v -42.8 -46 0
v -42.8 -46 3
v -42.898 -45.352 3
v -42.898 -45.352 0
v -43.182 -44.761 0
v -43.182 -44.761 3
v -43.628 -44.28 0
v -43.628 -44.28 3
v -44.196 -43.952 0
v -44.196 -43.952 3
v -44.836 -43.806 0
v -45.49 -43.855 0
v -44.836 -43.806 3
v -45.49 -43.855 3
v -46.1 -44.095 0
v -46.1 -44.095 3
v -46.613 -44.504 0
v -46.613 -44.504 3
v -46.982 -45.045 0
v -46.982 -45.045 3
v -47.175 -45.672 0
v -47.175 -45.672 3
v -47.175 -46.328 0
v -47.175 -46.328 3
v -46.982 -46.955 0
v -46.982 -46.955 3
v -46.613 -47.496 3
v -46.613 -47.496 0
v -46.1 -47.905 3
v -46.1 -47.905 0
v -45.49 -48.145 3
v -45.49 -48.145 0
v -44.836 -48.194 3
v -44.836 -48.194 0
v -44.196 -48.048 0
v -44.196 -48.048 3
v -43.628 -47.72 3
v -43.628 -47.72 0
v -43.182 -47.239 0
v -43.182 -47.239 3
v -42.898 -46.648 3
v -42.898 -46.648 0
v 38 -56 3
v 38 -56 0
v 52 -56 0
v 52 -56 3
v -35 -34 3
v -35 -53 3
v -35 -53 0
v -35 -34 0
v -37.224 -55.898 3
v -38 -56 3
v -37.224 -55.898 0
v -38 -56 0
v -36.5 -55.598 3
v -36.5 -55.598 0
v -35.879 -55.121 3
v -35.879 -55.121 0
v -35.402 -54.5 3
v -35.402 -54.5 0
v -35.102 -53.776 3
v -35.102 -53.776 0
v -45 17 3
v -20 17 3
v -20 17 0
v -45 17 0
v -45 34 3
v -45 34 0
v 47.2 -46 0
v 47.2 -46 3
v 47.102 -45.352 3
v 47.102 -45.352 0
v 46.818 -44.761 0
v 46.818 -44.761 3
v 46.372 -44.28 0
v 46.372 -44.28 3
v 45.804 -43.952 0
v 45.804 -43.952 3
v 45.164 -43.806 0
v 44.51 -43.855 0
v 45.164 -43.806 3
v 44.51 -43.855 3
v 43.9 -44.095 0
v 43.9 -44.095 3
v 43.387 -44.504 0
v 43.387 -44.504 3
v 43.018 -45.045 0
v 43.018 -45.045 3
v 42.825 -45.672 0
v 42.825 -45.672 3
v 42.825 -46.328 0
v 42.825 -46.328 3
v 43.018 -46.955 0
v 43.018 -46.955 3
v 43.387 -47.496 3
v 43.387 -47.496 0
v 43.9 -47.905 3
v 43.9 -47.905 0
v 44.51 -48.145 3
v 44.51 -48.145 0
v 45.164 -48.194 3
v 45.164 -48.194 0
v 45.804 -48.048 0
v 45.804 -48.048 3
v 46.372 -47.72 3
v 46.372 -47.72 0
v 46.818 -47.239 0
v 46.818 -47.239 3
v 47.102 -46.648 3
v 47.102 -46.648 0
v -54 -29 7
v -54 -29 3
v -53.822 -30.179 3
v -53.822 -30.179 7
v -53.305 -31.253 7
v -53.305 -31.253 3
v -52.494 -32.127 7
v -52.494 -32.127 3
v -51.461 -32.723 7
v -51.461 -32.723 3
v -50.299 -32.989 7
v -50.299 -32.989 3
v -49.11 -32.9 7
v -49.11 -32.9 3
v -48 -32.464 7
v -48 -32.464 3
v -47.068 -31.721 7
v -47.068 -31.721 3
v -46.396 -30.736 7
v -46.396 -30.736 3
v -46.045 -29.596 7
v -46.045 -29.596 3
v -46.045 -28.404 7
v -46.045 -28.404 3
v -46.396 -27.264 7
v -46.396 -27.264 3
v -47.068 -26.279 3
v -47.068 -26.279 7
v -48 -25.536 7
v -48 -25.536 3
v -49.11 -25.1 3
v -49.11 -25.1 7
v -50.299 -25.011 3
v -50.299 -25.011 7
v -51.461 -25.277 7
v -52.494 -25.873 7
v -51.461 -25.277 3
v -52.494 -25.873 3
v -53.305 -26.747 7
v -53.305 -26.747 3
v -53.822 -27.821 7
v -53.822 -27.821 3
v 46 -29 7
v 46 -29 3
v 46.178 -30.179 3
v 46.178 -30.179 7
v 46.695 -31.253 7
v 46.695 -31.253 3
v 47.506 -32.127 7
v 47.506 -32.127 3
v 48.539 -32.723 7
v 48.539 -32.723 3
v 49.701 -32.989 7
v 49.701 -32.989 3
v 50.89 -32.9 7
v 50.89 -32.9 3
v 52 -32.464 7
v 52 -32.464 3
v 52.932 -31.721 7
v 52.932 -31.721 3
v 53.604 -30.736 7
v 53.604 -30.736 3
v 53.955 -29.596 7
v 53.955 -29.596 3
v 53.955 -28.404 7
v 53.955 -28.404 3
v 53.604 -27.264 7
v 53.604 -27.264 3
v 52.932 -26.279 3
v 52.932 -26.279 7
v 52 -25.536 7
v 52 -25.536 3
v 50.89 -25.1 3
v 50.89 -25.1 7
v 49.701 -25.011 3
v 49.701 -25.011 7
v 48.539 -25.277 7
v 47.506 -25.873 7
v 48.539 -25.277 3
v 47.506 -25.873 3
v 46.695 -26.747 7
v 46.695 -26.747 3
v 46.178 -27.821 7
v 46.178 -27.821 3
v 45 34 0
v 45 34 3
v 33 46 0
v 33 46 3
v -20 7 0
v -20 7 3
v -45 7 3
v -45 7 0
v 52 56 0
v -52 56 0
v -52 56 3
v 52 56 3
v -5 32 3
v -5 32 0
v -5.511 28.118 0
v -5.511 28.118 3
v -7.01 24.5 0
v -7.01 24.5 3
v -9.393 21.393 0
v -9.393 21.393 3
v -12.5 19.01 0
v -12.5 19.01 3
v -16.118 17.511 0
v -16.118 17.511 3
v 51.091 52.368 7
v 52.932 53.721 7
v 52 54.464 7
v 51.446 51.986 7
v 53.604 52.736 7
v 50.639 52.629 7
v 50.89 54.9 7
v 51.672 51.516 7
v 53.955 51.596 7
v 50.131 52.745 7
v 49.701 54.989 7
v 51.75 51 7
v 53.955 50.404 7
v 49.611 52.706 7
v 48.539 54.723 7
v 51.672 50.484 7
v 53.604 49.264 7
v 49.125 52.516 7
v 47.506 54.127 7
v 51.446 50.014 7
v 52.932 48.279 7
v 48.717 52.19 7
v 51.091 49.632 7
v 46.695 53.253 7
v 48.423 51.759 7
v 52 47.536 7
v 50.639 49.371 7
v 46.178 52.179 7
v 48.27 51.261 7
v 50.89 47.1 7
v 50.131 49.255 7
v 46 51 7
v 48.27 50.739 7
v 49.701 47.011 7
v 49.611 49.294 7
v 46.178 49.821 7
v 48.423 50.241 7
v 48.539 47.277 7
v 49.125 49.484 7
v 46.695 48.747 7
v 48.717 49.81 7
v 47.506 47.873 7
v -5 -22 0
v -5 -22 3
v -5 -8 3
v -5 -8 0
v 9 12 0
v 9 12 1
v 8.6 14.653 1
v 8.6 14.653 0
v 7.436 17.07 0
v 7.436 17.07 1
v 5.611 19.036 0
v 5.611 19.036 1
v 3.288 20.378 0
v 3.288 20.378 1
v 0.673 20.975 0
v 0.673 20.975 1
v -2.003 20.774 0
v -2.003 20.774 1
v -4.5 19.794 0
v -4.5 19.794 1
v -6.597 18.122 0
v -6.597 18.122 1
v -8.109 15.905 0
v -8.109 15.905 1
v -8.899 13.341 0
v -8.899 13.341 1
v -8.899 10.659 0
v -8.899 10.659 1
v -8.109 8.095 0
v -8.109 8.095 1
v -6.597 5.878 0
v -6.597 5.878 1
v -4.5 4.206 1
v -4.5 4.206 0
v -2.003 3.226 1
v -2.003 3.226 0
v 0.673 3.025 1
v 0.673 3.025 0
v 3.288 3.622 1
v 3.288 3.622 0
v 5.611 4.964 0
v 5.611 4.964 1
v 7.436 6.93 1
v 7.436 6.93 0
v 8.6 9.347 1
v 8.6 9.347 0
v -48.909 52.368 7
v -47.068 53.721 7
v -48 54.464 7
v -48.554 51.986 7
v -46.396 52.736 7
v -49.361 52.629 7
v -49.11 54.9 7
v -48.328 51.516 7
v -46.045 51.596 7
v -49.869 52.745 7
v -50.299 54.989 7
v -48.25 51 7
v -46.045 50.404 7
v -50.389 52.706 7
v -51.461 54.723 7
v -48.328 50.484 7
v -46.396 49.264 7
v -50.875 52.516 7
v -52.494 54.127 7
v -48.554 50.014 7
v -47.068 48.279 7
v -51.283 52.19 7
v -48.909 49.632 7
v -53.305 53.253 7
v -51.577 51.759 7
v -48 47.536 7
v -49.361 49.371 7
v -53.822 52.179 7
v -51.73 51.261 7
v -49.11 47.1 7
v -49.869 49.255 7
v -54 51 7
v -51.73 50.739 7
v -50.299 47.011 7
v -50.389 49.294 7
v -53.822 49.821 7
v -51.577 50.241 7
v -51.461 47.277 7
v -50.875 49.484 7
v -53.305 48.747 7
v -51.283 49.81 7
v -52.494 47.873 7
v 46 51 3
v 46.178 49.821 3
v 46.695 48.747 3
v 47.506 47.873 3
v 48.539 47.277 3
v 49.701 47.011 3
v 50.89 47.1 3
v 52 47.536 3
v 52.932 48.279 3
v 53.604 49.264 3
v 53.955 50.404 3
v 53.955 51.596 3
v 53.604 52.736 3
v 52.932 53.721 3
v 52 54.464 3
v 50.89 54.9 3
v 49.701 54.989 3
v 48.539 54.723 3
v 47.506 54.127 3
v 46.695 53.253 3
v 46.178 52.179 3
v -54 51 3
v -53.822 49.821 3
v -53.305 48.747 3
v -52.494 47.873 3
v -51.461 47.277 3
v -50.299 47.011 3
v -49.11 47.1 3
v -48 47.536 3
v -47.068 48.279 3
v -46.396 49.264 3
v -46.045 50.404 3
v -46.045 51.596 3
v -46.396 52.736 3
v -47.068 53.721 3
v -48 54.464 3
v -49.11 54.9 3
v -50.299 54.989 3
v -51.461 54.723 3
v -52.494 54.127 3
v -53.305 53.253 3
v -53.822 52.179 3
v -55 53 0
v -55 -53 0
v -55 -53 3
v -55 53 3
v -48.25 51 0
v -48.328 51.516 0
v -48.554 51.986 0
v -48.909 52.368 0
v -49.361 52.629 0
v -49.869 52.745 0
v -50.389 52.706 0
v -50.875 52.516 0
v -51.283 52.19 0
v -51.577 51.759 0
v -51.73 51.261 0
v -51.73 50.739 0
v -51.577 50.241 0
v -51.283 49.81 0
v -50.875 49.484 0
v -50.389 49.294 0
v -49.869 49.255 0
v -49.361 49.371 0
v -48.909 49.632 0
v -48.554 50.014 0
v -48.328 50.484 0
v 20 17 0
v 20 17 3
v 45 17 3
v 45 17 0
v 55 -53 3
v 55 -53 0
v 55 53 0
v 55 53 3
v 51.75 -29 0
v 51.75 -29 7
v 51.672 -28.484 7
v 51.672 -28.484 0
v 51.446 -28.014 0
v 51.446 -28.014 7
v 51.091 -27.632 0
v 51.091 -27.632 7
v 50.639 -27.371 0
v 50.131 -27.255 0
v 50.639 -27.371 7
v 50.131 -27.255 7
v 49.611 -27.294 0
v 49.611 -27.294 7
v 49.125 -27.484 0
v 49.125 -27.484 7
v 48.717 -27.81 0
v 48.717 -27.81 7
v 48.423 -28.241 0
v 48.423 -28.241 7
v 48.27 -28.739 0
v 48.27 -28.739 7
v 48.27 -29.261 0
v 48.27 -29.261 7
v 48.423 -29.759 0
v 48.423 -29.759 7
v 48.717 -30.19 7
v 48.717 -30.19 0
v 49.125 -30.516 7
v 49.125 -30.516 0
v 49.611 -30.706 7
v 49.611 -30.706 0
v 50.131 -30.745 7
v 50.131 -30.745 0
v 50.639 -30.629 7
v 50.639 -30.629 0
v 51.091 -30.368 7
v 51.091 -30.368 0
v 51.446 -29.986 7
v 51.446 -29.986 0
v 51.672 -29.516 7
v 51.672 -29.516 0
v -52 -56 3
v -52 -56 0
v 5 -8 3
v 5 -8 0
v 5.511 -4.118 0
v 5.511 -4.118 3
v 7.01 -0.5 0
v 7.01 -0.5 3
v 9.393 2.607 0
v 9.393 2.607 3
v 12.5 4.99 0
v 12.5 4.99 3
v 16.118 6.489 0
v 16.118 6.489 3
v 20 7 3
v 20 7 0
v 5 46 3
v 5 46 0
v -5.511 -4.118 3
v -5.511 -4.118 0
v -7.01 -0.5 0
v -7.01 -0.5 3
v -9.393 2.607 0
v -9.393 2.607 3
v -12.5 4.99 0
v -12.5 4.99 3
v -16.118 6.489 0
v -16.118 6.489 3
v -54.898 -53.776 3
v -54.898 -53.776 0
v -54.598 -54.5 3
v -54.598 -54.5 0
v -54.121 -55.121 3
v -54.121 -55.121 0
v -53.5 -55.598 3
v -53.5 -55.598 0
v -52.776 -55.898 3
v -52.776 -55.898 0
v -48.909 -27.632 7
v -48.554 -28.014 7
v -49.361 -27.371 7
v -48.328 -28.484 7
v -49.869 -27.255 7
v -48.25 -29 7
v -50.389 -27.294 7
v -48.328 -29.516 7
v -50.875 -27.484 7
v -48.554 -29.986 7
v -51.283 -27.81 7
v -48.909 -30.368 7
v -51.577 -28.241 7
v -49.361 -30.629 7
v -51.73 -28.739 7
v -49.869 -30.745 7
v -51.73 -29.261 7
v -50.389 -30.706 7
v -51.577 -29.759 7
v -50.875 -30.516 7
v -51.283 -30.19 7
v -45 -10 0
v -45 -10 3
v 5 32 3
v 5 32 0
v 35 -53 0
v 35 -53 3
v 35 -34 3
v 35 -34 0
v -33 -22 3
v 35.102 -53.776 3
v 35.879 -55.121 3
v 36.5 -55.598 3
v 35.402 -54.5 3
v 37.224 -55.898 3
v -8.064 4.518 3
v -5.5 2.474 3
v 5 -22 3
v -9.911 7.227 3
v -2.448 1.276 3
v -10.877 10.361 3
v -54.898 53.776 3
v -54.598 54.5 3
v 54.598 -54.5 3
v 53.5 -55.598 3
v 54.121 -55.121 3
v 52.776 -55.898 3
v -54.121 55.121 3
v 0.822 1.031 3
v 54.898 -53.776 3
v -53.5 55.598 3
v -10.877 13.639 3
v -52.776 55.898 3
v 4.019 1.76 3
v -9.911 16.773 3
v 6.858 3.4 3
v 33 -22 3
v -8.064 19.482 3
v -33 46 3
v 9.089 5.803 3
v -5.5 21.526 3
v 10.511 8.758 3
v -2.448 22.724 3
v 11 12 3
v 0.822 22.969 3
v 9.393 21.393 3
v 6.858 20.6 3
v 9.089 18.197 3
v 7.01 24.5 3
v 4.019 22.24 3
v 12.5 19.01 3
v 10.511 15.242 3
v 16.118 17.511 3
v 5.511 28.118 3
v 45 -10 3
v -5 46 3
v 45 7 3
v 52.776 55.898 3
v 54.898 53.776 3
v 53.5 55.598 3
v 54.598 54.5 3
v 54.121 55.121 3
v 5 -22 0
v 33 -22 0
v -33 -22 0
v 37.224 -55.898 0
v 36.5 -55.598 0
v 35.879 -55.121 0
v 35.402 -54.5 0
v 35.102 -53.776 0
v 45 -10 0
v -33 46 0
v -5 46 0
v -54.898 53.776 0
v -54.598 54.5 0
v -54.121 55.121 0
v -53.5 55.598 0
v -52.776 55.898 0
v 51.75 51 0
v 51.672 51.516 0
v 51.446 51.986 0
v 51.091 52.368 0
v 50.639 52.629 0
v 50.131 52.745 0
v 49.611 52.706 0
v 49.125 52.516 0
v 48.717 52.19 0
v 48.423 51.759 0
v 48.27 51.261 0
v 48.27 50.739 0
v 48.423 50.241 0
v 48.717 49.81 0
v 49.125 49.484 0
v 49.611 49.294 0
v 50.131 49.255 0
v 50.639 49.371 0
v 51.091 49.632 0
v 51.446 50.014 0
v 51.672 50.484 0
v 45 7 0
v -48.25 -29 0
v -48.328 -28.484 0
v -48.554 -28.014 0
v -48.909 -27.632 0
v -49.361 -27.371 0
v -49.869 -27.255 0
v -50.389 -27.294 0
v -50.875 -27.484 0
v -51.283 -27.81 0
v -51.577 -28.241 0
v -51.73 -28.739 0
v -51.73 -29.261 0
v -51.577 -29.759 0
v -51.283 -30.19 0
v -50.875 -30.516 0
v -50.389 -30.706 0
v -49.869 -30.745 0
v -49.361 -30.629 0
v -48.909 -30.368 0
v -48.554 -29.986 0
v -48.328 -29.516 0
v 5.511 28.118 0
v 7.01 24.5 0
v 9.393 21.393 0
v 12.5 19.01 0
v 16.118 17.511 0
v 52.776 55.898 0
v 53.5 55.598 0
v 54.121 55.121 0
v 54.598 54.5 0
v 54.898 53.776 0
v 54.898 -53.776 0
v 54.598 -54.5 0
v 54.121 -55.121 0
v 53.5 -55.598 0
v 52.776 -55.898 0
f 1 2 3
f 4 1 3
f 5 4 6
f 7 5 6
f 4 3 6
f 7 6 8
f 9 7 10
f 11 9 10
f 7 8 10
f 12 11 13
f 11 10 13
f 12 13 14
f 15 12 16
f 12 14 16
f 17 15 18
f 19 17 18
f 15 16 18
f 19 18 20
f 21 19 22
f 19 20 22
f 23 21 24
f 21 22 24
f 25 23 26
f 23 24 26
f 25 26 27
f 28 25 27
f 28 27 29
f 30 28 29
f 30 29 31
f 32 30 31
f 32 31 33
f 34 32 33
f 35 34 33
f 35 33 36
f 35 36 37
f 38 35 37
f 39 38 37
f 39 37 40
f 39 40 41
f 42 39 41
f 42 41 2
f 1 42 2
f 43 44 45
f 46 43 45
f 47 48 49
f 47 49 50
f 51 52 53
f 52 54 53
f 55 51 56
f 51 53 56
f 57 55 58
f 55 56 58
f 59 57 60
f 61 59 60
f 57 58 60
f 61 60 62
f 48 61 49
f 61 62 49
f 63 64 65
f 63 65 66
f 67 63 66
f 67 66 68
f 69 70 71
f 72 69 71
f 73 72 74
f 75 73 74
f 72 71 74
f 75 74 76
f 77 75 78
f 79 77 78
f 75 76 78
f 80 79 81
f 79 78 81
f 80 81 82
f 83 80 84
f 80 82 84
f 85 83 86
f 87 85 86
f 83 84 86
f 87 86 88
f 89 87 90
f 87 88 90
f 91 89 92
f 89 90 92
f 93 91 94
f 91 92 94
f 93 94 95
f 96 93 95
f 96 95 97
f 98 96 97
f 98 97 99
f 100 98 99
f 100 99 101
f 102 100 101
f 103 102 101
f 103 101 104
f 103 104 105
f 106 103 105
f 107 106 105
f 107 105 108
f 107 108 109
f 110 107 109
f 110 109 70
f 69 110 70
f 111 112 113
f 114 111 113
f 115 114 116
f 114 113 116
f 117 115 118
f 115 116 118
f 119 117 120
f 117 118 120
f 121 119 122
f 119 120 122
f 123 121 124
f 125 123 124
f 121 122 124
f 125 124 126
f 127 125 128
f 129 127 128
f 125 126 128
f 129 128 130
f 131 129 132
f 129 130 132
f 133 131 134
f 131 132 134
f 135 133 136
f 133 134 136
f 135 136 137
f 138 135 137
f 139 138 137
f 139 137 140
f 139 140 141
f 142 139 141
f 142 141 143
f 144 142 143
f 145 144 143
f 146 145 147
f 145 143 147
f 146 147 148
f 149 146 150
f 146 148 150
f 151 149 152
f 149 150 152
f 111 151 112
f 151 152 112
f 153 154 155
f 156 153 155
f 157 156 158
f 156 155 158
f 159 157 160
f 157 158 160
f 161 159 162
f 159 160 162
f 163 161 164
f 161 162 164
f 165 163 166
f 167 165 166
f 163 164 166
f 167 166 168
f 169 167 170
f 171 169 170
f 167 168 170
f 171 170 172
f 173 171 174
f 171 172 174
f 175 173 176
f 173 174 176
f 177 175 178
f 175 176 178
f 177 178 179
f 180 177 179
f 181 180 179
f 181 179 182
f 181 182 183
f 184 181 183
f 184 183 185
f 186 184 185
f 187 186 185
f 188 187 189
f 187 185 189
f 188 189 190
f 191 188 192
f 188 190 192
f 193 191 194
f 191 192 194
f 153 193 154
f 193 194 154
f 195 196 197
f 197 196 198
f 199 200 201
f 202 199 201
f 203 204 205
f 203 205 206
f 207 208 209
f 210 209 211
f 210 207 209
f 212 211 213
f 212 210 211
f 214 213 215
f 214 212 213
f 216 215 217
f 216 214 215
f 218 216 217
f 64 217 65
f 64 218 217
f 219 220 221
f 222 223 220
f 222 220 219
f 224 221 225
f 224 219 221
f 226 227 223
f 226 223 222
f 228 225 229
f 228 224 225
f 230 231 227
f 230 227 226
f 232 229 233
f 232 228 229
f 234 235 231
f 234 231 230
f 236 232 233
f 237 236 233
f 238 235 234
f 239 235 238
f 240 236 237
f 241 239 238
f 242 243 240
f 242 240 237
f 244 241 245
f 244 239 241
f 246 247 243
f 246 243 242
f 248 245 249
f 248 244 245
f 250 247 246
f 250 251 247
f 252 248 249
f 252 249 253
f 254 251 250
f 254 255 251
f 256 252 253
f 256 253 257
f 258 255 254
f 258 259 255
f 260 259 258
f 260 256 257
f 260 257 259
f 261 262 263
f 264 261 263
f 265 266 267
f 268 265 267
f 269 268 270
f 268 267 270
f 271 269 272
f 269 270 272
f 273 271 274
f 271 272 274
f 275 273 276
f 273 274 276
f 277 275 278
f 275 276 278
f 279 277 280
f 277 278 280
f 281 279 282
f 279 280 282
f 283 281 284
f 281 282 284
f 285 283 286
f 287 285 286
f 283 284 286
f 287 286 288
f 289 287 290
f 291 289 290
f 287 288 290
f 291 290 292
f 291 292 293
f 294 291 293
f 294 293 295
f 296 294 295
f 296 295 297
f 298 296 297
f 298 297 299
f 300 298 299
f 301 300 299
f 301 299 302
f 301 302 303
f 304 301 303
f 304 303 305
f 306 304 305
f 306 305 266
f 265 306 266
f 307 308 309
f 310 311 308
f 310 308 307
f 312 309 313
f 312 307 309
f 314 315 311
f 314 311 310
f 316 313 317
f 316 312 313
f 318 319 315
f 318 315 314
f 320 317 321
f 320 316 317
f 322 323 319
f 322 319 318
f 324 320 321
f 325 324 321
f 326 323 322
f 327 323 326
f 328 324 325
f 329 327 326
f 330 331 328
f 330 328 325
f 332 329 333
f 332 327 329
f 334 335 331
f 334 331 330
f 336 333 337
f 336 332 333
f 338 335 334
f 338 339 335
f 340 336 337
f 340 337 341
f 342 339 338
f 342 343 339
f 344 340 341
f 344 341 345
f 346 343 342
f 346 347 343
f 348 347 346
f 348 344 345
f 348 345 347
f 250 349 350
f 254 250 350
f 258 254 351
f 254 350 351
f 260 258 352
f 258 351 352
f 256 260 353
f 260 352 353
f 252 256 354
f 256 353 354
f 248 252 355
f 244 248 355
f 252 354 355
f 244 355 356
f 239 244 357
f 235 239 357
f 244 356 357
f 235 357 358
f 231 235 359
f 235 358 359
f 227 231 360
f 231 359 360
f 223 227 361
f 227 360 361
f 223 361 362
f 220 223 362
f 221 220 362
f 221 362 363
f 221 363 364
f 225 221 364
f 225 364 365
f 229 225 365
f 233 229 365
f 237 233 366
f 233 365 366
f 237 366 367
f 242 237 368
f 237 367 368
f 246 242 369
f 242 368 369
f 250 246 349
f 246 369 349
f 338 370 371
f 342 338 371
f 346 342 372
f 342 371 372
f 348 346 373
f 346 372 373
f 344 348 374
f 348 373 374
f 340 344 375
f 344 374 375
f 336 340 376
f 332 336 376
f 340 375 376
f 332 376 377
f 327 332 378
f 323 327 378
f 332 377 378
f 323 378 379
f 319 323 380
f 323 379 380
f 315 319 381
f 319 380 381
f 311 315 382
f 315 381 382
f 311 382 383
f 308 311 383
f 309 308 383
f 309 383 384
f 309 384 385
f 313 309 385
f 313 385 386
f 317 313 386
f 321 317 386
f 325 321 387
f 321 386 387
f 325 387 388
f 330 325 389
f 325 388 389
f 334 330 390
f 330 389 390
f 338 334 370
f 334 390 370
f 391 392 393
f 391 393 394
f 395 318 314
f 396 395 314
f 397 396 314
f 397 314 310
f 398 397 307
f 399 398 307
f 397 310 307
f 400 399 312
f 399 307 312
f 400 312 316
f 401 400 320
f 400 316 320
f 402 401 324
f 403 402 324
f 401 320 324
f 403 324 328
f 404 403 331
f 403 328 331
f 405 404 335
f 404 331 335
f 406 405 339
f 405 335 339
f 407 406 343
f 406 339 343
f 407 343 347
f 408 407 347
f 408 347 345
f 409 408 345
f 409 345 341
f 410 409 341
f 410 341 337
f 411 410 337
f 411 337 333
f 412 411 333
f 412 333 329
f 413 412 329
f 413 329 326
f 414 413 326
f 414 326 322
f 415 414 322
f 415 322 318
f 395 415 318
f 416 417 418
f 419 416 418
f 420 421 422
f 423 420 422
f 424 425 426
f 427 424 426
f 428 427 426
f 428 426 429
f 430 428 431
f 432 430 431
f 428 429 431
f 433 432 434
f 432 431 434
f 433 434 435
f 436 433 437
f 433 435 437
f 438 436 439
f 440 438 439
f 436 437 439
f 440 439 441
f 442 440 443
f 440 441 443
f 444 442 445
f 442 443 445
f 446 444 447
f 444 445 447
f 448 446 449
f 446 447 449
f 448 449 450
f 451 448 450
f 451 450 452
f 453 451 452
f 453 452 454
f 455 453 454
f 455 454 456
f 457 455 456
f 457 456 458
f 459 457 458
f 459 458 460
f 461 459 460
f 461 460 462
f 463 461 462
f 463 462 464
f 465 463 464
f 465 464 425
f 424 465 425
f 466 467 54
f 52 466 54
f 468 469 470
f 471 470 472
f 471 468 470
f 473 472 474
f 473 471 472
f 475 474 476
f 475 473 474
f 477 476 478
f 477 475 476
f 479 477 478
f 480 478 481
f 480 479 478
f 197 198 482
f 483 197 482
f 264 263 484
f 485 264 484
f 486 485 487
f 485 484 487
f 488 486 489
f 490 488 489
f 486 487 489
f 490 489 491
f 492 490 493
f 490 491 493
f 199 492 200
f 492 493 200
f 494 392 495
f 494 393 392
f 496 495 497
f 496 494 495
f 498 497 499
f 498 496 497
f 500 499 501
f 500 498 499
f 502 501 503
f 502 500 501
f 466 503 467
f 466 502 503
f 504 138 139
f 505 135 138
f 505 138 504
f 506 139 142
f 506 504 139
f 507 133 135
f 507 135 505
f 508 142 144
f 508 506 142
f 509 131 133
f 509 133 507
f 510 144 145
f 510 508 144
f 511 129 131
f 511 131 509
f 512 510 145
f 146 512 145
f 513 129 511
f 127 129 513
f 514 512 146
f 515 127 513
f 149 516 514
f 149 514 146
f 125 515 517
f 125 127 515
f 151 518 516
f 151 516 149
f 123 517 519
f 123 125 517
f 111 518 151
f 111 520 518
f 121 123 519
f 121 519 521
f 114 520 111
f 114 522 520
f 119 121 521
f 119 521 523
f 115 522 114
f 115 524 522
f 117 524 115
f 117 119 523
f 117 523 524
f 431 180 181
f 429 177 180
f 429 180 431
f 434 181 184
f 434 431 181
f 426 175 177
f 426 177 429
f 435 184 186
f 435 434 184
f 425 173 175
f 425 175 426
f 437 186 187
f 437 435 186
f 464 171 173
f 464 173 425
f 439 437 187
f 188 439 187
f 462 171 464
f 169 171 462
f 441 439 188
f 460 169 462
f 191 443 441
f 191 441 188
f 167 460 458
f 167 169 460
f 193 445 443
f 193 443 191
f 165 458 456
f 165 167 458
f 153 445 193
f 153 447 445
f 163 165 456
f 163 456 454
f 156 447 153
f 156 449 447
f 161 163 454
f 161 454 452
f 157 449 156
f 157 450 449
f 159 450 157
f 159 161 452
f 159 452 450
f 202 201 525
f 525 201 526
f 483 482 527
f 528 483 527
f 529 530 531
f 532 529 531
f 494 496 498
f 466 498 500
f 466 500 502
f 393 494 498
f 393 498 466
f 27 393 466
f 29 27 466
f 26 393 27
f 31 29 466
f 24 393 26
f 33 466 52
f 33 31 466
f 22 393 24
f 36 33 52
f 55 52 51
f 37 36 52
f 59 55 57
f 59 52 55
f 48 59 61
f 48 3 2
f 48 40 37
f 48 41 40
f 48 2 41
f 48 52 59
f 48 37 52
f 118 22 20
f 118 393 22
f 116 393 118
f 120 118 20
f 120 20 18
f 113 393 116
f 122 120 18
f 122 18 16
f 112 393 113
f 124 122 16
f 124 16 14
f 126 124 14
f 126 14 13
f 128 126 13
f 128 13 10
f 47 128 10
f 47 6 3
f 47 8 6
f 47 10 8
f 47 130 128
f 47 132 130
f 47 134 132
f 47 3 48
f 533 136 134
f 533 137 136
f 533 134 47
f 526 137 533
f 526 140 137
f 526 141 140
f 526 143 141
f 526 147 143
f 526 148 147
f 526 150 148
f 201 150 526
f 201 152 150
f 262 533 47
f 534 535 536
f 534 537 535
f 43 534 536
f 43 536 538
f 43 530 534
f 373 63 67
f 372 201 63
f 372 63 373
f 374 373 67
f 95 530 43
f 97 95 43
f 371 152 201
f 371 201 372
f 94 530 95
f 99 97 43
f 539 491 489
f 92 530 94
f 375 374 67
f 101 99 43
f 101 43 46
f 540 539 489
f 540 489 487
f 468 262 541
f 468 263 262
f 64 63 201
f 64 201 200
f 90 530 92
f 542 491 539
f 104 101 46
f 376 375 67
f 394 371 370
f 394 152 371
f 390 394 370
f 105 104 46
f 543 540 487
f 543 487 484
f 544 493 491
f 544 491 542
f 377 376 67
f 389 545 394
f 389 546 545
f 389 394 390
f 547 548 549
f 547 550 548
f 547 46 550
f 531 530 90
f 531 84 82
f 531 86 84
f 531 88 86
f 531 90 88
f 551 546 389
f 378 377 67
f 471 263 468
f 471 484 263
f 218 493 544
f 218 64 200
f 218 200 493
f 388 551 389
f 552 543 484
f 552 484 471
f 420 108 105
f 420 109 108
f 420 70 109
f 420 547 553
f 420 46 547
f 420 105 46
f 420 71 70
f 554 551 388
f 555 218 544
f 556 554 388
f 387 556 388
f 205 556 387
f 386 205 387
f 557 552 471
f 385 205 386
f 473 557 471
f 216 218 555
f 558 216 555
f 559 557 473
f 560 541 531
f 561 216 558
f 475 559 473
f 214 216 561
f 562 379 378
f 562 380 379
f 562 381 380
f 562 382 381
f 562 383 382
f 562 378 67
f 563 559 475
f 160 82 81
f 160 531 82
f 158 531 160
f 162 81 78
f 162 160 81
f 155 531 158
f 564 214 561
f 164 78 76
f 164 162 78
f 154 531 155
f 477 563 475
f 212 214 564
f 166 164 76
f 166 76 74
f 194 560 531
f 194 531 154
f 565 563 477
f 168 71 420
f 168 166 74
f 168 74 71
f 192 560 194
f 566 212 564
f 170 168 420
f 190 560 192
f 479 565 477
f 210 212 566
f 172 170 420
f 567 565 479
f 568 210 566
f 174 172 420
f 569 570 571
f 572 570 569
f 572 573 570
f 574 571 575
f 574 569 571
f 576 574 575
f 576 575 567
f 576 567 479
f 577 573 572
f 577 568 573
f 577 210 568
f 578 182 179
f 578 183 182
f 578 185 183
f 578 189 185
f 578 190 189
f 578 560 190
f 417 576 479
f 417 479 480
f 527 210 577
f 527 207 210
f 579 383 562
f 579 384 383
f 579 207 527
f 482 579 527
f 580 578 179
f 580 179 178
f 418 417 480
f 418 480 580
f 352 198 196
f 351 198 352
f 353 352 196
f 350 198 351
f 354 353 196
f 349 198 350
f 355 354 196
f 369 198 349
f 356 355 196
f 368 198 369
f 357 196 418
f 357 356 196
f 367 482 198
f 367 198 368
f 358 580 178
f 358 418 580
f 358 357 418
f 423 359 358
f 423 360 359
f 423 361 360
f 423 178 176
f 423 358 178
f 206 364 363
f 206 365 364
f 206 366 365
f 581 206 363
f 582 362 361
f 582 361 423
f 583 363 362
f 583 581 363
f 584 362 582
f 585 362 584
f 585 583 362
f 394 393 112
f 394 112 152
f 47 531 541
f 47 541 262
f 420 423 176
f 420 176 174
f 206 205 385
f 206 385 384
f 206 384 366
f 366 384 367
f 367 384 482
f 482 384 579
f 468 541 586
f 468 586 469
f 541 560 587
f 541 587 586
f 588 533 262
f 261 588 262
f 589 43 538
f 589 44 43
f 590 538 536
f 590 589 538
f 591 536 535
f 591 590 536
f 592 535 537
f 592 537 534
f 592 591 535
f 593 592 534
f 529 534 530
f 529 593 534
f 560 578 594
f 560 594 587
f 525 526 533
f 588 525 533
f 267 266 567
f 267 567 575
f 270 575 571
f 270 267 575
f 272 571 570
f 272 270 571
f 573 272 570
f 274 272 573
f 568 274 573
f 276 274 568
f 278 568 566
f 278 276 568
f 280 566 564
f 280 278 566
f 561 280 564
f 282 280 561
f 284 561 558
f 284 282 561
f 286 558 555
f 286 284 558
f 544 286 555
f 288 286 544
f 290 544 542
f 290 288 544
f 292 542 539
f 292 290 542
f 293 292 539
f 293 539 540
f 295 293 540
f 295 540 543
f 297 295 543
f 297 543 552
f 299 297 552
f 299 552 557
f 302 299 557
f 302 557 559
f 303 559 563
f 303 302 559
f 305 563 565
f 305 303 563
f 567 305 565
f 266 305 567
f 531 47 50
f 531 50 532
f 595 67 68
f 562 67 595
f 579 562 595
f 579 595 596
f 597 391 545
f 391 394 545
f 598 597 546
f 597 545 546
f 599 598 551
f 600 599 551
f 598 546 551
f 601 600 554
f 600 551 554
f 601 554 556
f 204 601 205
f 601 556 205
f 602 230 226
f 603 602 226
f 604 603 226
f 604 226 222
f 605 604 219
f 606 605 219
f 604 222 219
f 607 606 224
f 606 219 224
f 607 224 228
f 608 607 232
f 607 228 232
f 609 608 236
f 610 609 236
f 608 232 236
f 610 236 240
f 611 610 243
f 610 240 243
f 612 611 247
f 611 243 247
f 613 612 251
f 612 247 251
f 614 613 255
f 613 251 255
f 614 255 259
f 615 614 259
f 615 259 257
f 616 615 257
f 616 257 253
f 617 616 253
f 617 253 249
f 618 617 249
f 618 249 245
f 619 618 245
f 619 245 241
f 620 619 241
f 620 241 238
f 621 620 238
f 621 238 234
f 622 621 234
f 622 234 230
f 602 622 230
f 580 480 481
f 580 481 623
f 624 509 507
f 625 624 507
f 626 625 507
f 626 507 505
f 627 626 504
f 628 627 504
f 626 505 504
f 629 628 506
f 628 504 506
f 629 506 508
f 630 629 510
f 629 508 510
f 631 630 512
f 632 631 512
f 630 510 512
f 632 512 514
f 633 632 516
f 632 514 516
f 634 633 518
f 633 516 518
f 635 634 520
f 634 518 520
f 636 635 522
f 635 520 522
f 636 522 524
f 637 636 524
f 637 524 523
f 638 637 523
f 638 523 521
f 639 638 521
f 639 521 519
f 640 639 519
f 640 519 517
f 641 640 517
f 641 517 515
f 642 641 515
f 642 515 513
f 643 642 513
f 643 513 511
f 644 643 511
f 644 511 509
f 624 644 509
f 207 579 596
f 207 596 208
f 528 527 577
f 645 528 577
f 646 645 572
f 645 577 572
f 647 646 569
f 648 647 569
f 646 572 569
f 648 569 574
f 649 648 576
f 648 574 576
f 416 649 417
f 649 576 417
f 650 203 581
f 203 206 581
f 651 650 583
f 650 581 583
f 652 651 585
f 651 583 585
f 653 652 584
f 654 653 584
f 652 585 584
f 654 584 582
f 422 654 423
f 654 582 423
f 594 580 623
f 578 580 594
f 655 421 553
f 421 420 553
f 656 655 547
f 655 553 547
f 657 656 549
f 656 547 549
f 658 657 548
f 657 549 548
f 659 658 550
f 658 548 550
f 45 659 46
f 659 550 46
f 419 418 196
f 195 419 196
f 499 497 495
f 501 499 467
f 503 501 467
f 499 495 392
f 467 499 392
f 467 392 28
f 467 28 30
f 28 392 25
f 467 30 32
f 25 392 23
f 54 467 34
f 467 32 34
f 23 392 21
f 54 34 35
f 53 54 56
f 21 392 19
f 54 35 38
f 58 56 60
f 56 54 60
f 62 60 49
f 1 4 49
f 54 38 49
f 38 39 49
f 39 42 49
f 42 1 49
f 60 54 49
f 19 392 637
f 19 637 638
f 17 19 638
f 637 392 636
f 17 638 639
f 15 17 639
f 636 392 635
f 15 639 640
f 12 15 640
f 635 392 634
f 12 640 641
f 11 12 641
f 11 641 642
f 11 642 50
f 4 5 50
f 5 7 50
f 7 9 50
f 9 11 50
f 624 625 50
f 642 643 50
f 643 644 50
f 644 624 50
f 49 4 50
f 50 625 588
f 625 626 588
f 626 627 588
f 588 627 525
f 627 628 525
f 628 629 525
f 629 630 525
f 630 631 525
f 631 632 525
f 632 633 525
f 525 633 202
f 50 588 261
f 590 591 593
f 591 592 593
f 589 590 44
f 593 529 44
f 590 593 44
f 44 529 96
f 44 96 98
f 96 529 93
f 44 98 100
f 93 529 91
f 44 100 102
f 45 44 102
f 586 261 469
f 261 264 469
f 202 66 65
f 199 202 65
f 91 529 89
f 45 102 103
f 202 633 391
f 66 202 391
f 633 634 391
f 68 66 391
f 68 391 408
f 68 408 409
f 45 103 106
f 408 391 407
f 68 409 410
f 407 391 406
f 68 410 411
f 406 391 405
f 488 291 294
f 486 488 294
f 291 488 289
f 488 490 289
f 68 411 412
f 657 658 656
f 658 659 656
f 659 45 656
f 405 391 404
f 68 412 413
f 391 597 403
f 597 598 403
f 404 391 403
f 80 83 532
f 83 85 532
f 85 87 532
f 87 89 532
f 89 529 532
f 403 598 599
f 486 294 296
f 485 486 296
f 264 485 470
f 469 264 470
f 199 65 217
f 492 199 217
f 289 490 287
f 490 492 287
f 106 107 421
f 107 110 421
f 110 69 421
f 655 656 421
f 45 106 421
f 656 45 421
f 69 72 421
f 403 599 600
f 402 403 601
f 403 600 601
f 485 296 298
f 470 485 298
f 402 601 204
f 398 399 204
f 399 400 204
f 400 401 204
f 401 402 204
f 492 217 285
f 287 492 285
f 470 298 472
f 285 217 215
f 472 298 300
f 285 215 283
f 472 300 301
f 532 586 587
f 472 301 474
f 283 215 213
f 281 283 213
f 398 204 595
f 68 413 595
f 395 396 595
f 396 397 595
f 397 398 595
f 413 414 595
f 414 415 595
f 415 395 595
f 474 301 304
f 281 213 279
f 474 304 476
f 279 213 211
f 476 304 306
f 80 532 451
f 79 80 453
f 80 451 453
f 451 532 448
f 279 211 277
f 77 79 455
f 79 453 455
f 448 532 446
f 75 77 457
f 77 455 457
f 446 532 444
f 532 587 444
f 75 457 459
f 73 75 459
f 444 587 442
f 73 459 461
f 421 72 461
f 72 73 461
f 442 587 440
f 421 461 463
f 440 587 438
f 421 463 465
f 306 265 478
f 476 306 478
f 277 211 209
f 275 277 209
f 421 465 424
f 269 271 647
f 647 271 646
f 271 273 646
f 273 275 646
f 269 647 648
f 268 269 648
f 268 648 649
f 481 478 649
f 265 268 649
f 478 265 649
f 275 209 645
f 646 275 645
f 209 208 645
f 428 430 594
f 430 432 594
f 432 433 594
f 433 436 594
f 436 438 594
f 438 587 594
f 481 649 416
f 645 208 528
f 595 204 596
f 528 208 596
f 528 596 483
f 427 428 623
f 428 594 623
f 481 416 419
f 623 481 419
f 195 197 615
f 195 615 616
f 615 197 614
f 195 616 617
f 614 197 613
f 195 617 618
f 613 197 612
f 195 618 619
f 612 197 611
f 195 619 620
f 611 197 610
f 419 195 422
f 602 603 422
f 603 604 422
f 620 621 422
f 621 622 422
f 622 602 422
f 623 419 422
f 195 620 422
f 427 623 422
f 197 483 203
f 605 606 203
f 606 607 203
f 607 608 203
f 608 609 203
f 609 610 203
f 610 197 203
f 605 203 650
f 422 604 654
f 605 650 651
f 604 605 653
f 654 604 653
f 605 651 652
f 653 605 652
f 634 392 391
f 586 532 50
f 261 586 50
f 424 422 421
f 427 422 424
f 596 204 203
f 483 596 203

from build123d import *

# Parameters (mm, degrees)
SKETCH1_W           = 110
SKETCH1_H           = 112
BOSS_EXTRUDE1_DEPTH = 3
SKETCH2_R           = 9
SKETCH2_W           = 70
SKETCH2_H           = 22
CUT_EXTRUDE1_DEPTH  = 79.549347547
CUT_EXTRUDE2_DEPTH  = 79.549347547
CHAMFER1_SIZE       = 2
SKETCH4_R           = 4
BOSS_EXTRUDE2_DEPTH = 4
SKETCH5_R           = 1.75
CUT_EXTRUDE3_DEPTH  = 79.803553219
FILLET1_R           = 3
SKETCH6_R           = 2.2
CUT_EXTRUDE4_DEPTH  = 79.593892893


with BuildPart() as part:
    # Sketch1 → Boss-Extrude1 (new body)
    with BuildSketch(Plane.XY):
        Rectangle(SKETCH1_W, SKETCH1_H)
    extrude(amount=BOSS_EXTRUDE1_DEPTH)

    # Sketch2 → Cut-Extrude1 (cut, through all)
    with BuildSketch(Plane.XY.offset(3)):
        with Locations((0, 12)):
            Circle(SKETCH2_R)
        with Locations((0, -45)):
            Rectangle(SKETCH2_W, SKETCH2_H)
    extrude(amount=-CUT_EXTRUDE1_DEPTH, mode=Mode.SUBTRACT)

    # Sketch3 → Cut-Extrude2 (cut, through all)
    with BuildSketch(Plane.XY.offset(3)):
        with BuildLine():
            Line((-33, 46), (-5, 46))
            Line((-5, 46), (-5, 32))
            ThreePointArc((-5, 32), (-9.393398282, 21.393398282), (-20, 17))
            Line((-20, 17), (-45, 17))
            Line((-45, 17), (-45, 34))
            Line((-45, 34), (-33, 46))
        make_face()
        with BuildLine():
            Line((45, 34), (33, 46))
            Line((33, 46), (5, 46))
            Line((5, 46), (5, 32))
            ThreePointArc((5, 32), (9.393398282, 21.393398282), (20, 17))
            Line((20, 17), (45, 17))
            Line((45, 17), (45, 34))
        make_face()
        with BuildLine():
            Line((33, -22), (5, -22))
            Line((5, -22), (5, -8))
            ThreePointArc((5, -8), (9.393398282, 2.606601718), (20, 7))
            Line((20, 7), (45, 7))
            Line((45, 7), (45, -10))
            Line((45, -10), (33, -22))
        make_face()
        with BuildLine():
            Line((-45, -10), (-33, -22))
            Line((-33, -22), (-5, -22))
            Line((-5, -22), (-5, -8))
            ThreePointArc((-5, -8), (-9.393398282, 2.606601718), (-20, 7))
            Line((-20, 7), (-45, 7))
            Line((-45, 7), (-45, -10))
        make_face()
    extrude(amount=-CUT_EXTRUDE2_DEPTH, mode=Mode.SUBTRACT)

    # Chamfer1
    chamfer1_edges = [part.edges().sort_by_distance(p)[0] for p in [
        (-9, 12, 3),
    ]]
    chamfer(chamfer1_edges, length=CHAMFER1_SIZE)

    # Sketch4 → Boss-Extrude2 (add)
    with BuildSketch(Plane.XY.offset(3)):
        with Locations(Location((-50, -29, 0), (0, 0, 180))):
            Circle(SKETCH4_R)
        with Locations(Location((50, -29, 0), (0, 0, 180))):
            Circle(SKETCH4_R)
        with Locations(Location((50, 51, 0), (0, 0, 180))):
            Circle(SKETCH4_R)
        with Locations(Location((-50, 51, 0), (0, 0, 180))):
            Circle(SKETCH4_R)
    extrude(amount=BOSS_EXTRUDE2_DEPTH)

    # Sketch5 → Cut-Extrude3 (cut, through all)
    with BuildSketch(Plane.XY.offset(7)):
        with Locations((-50, 51)):
            Circle(SKETCH5_R)
        with Locations((50, 51)):
            Circle(SKETCH5_R)
        with Locations((50, -29)):
            Circle(SKETCH5_R)
        with Locations((-50, -29)):
            Circle(SKETCH5_R)
    extrude(amount=-CUT_EXTRUDE3_DEPTH, mode=Mode.SUBTRACT)

    # Fillet1
    fillet1_edges = [part.edges().sort_by_distance(p)[0] for p in [
        (-35, -56, 1.5),
        (35, -56, 1.5),
        (-55, 56, 1.5),
        (55, 56, 1.5),
        (55, -56, 1.5),
        (-55, -56, 1.5),
    ]]
    fillet(fillet1_edges, radius=FILLET1_R)

    # Sketch6 → Cut-Extrude4 (cut, through all)
    with BuildSketch(Plane.XY.offset(3)):
        with Locations((-45, -46)):
            Circle(SKETCH6_R)
        with Locations((45, -46)):
            Circle(SKETCH6_R)
    extrude(amount=-CUT_EXTRUDE4_DEPTH, mode=Mode.SUBTRACT)


solid = part.part
